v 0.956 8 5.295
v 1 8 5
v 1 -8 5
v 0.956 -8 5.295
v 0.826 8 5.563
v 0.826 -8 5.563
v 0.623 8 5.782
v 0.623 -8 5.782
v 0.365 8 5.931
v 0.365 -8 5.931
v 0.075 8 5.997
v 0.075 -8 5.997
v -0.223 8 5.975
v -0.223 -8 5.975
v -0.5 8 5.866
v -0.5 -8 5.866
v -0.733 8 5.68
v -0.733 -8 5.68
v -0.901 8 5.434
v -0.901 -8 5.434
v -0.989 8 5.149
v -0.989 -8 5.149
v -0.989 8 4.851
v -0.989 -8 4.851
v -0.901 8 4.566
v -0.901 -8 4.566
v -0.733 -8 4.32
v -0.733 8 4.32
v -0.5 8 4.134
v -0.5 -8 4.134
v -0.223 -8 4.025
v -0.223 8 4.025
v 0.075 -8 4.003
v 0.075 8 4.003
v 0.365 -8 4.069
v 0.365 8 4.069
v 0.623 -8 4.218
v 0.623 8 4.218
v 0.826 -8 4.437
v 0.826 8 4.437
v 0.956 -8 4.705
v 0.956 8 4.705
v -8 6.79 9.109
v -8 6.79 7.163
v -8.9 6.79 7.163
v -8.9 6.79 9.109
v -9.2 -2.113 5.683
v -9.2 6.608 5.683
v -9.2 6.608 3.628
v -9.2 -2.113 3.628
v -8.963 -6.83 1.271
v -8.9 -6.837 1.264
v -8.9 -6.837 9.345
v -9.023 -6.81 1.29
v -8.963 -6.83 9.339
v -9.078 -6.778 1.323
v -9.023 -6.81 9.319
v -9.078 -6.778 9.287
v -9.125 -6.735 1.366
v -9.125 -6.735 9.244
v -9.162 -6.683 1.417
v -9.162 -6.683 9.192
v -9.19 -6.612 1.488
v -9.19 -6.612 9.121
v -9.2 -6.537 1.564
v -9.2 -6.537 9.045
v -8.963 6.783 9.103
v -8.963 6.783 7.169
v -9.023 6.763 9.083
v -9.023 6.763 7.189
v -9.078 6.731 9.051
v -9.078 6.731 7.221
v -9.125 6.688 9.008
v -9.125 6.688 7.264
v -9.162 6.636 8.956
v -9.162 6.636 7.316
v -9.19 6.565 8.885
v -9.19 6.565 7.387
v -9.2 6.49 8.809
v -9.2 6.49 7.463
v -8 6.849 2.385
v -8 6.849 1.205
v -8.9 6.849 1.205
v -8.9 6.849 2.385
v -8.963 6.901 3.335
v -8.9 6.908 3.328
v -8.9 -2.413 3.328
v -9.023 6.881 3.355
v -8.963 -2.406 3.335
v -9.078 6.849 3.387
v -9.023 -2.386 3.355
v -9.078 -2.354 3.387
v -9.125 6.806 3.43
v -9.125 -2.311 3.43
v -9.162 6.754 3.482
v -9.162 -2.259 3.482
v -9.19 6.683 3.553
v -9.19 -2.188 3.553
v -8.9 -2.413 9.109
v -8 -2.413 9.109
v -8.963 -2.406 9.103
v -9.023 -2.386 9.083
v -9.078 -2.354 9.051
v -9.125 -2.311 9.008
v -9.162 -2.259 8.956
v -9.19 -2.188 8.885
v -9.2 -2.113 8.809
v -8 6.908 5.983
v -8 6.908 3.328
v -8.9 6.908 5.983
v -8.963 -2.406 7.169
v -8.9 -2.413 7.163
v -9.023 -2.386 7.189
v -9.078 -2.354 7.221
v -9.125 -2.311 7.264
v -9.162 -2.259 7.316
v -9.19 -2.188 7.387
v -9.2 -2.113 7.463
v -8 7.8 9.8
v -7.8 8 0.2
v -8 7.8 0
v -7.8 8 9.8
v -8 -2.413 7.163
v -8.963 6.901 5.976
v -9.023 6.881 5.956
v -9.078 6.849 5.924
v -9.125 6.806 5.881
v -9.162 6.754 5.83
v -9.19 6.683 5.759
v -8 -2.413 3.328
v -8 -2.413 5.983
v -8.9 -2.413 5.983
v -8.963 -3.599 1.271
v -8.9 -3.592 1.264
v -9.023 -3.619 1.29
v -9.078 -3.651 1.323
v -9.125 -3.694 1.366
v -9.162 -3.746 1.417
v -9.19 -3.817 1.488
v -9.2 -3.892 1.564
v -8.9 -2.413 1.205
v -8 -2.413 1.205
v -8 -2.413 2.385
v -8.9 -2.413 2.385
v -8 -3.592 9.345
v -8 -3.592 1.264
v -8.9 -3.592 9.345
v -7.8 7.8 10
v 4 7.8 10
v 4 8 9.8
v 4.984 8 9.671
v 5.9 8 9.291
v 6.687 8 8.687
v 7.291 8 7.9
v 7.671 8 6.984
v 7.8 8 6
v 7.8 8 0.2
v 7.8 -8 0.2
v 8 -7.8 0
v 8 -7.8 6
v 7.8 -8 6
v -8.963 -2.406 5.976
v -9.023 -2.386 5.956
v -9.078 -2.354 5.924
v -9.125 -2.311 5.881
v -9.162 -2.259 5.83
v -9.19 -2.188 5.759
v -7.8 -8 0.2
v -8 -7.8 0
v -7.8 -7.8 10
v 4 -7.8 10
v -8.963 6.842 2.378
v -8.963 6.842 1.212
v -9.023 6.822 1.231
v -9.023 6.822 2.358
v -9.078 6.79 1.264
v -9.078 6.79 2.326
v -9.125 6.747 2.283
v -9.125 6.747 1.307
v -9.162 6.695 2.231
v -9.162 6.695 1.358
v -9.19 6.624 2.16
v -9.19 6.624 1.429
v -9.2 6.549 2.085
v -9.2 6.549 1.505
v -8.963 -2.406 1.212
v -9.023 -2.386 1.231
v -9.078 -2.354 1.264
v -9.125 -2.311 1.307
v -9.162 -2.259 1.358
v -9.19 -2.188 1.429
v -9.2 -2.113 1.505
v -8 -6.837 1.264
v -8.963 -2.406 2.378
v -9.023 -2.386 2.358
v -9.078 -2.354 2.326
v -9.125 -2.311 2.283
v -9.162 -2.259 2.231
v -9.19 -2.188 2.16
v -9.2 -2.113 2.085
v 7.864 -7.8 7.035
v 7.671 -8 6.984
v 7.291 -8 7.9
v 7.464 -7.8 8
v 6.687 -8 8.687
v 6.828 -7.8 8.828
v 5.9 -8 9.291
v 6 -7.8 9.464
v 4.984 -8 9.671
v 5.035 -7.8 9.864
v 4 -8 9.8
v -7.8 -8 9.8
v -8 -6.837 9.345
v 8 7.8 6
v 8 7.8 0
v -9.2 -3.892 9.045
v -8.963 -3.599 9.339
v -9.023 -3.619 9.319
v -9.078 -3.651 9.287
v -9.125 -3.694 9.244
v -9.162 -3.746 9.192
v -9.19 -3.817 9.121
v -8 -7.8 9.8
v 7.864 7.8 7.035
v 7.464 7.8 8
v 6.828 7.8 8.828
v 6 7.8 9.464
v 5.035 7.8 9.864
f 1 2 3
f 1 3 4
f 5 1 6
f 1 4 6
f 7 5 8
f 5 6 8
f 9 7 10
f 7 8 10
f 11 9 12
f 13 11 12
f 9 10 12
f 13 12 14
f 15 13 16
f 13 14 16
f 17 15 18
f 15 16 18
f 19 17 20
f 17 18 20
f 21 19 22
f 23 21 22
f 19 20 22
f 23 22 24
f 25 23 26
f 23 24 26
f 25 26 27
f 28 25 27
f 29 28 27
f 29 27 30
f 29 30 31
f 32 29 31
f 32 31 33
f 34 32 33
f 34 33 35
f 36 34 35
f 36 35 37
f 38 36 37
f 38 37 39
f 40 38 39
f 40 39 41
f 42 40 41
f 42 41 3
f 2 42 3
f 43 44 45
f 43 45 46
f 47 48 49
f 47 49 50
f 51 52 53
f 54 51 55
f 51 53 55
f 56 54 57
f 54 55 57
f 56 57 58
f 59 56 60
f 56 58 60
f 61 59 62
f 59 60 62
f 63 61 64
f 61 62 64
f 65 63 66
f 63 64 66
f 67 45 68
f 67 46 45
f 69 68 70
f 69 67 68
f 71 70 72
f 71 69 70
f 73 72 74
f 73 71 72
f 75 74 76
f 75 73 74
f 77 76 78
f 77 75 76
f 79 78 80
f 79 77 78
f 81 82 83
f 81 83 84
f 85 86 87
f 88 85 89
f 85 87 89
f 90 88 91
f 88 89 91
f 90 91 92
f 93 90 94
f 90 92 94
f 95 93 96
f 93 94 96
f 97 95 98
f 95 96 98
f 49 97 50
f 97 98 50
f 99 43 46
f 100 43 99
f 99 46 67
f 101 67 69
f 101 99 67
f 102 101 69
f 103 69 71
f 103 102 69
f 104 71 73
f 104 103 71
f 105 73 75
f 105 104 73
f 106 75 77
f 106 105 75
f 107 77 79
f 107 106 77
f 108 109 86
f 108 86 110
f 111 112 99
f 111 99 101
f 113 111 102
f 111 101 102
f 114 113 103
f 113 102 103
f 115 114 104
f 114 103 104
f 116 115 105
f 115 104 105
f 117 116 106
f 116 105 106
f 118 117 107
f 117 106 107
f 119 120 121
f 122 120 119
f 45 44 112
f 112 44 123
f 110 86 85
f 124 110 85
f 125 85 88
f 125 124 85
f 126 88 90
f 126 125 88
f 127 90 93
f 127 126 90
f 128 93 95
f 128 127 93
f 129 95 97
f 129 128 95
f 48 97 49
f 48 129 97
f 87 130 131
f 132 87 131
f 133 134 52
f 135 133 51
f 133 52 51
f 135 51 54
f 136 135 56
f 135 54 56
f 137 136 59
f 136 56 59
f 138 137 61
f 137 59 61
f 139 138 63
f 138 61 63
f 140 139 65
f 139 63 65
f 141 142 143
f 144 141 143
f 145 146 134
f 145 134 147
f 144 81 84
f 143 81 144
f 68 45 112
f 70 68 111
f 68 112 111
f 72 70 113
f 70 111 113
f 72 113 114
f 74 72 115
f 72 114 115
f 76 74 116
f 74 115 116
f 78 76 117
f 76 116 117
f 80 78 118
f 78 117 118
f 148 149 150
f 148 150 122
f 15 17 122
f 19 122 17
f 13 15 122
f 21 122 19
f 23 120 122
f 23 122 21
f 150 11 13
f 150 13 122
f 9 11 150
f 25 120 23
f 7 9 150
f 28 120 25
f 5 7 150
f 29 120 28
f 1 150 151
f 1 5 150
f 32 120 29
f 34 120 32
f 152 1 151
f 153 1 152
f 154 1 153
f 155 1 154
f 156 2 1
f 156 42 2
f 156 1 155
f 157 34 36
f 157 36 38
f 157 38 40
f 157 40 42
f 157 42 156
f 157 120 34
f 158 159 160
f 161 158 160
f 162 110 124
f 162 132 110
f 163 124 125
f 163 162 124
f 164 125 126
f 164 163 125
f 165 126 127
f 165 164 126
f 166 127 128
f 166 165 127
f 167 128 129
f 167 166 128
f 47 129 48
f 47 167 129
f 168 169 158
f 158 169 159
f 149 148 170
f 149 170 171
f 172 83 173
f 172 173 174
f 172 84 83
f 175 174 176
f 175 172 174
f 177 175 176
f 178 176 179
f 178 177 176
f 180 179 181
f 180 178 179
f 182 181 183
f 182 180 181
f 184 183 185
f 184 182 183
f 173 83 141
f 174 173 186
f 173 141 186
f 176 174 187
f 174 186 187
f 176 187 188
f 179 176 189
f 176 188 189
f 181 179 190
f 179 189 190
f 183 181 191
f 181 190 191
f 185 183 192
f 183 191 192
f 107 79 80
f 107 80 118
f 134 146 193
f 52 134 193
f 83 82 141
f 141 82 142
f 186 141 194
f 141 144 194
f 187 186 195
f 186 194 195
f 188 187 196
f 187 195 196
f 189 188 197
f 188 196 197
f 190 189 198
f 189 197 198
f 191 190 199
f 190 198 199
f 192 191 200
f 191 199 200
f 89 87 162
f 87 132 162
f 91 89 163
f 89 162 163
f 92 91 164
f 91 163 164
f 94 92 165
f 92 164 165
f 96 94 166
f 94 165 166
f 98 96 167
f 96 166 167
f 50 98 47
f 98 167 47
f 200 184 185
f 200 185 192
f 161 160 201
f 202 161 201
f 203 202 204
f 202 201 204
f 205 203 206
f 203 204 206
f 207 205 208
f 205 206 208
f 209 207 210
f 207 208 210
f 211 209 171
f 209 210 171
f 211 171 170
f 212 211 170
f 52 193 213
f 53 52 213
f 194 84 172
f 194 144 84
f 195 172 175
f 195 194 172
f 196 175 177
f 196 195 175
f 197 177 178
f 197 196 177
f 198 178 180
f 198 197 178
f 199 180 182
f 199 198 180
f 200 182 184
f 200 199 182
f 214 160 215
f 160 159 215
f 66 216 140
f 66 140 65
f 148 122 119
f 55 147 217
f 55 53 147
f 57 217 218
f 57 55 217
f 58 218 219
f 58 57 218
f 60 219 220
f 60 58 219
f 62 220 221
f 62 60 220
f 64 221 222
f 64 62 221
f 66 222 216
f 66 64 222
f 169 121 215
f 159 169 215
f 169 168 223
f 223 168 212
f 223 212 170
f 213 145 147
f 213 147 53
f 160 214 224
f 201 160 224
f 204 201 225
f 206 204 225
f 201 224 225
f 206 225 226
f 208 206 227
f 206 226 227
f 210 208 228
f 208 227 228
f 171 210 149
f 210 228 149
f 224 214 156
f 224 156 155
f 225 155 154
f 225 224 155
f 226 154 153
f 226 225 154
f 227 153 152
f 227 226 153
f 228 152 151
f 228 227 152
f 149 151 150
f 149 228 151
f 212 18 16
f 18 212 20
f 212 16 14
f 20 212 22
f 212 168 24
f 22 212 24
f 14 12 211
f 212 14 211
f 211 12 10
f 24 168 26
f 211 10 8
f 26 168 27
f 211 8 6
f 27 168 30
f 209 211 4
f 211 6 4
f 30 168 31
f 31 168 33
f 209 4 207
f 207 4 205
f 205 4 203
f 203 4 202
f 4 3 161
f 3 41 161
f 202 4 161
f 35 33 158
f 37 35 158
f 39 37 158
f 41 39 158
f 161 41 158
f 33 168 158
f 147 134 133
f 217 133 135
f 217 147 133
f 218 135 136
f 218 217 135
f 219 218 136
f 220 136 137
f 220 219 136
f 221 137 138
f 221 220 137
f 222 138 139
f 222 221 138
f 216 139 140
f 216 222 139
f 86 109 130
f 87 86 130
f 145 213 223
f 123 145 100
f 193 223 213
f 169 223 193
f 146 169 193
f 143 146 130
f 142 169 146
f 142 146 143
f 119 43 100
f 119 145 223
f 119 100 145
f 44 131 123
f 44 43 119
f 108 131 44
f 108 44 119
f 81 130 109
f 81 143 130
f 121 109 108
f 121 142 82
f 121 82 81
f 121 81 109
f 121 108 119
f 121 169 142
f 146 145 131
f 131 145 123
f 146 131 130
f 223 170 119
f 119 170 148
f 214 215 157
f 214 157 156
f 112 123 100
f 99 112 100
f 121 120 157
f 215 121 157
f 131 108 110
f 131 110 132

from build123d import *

# Parameters (mm, degrees)
F0_W     = 16
F0_H     = 16
F1_DEPTH = 10
F2_R     = 4
F3_W     = 9.202218
F3_H     = 1.946622
F3_W_2   = 9.320195
F3_H_2   = 2.654486
F3_W_3   = 9.261206
F3_H_3   = 1.179772
F3_W_4   = 3.244372
F3_H_4   = 8.081435
F4_DEPTH = 1.2
F5_R     = 0.3
F6_SIZE  = 0.2
F7_R     = 1
F8_DEPTH = 16.001


with BuildPart() as f1:
    # F0 (on Top) → F1 (new body)
    with BuildSketch(Plane.XY):
        Rectangle(F0_W, F0_H)
    extrude(amount=F1_DEPTH)

    # F2
    f2_edges = [f1.edges().sort_by_distance(p)[0] for p in [
        (8, 0, 10),
    ]]
    fillet(f2_edges, radius=F2_R)

    # F3 (on face) → F4 (join)
    with BuildSketch(Plane(origin=(-8, 0, 0), x_dir=(0, -1, 0), z_dir=(-1, 0, 0))):
        with Locations((-2.188604, 8.136063)):
            Rectangle(F3_W, F3_H)
        with Locations((-2.247592, 4.655737)):
            Rectangle(F3_W_2, F3_H_2)
        with Locations((-2.218098, 1.794791)):
            Rectangle(F3_W_3, F3_H_3)
        with Locations((5.214463, 5.304612)):
            Rectangle(F3_W_4, F3_H_4)
    extrude(amount=F4_DEPTH)

    # F5
    f5_edges = [f1.edges().sort_by_distance(p)[0] for p in [
        (-9.2, 2.188604, 9.109374),
        (-9.2, -2.412505, 8.136063),
        (-9.2, 2.188604, 7.162752),
        (-9.2, 2.247592, 5.98298),
        (-9.2, -2.412505, 4.655737),
        (-9.2, 2.247592, 3.328494),
        (-9.2, 2.218098, 2.384677),
        (-9.2, -2.412505, 1.794791),
        (-9.2, 2.218098, 1.204905),
        (-9.2, -5.214463, 9.345329),
        (-9.2, -6.836649, 5.304612),
        (-9.2, -3.592277, 5.304612),
        (-9.2, -5.214463, 1.263894),
        (-9.2, 6.789713, 8.136063),
        (-9.2, 6.90769, 4.655737),
        (-9.2, 6.848701, 1.794791),
    ]]
    fillet(f5_edges, radius=F5_R)

    # F6
    f6_edges = [f1.edges().sort_by_distance(p)[0] for p in [
        (8, -8, 3),
        (6.828427, -8, 8.828427),
        (0, -8, 0),
        (-2, -8, 10),
        (-8, -8, 5),
        (8, 8, 3),
        (6.828427, 8, 8.828427),
        (0, 8, 0),
        (-2, 8, 10),
        (-8, 8, 5),
        (-8, 0, 10),
    ]]
    chamfer(f6_edges, length=F6_SIZE)

    # F7 (on face) → F8 (cut, through all)
    with BuildSketch(Plane.XZ.offset(8)):
        with Locations((0, 5)):
            Circle(F7_R)
    extrude(amount=-F8_DEPTH, mode=Mode.SUBTRACT)


solid = f1.part
